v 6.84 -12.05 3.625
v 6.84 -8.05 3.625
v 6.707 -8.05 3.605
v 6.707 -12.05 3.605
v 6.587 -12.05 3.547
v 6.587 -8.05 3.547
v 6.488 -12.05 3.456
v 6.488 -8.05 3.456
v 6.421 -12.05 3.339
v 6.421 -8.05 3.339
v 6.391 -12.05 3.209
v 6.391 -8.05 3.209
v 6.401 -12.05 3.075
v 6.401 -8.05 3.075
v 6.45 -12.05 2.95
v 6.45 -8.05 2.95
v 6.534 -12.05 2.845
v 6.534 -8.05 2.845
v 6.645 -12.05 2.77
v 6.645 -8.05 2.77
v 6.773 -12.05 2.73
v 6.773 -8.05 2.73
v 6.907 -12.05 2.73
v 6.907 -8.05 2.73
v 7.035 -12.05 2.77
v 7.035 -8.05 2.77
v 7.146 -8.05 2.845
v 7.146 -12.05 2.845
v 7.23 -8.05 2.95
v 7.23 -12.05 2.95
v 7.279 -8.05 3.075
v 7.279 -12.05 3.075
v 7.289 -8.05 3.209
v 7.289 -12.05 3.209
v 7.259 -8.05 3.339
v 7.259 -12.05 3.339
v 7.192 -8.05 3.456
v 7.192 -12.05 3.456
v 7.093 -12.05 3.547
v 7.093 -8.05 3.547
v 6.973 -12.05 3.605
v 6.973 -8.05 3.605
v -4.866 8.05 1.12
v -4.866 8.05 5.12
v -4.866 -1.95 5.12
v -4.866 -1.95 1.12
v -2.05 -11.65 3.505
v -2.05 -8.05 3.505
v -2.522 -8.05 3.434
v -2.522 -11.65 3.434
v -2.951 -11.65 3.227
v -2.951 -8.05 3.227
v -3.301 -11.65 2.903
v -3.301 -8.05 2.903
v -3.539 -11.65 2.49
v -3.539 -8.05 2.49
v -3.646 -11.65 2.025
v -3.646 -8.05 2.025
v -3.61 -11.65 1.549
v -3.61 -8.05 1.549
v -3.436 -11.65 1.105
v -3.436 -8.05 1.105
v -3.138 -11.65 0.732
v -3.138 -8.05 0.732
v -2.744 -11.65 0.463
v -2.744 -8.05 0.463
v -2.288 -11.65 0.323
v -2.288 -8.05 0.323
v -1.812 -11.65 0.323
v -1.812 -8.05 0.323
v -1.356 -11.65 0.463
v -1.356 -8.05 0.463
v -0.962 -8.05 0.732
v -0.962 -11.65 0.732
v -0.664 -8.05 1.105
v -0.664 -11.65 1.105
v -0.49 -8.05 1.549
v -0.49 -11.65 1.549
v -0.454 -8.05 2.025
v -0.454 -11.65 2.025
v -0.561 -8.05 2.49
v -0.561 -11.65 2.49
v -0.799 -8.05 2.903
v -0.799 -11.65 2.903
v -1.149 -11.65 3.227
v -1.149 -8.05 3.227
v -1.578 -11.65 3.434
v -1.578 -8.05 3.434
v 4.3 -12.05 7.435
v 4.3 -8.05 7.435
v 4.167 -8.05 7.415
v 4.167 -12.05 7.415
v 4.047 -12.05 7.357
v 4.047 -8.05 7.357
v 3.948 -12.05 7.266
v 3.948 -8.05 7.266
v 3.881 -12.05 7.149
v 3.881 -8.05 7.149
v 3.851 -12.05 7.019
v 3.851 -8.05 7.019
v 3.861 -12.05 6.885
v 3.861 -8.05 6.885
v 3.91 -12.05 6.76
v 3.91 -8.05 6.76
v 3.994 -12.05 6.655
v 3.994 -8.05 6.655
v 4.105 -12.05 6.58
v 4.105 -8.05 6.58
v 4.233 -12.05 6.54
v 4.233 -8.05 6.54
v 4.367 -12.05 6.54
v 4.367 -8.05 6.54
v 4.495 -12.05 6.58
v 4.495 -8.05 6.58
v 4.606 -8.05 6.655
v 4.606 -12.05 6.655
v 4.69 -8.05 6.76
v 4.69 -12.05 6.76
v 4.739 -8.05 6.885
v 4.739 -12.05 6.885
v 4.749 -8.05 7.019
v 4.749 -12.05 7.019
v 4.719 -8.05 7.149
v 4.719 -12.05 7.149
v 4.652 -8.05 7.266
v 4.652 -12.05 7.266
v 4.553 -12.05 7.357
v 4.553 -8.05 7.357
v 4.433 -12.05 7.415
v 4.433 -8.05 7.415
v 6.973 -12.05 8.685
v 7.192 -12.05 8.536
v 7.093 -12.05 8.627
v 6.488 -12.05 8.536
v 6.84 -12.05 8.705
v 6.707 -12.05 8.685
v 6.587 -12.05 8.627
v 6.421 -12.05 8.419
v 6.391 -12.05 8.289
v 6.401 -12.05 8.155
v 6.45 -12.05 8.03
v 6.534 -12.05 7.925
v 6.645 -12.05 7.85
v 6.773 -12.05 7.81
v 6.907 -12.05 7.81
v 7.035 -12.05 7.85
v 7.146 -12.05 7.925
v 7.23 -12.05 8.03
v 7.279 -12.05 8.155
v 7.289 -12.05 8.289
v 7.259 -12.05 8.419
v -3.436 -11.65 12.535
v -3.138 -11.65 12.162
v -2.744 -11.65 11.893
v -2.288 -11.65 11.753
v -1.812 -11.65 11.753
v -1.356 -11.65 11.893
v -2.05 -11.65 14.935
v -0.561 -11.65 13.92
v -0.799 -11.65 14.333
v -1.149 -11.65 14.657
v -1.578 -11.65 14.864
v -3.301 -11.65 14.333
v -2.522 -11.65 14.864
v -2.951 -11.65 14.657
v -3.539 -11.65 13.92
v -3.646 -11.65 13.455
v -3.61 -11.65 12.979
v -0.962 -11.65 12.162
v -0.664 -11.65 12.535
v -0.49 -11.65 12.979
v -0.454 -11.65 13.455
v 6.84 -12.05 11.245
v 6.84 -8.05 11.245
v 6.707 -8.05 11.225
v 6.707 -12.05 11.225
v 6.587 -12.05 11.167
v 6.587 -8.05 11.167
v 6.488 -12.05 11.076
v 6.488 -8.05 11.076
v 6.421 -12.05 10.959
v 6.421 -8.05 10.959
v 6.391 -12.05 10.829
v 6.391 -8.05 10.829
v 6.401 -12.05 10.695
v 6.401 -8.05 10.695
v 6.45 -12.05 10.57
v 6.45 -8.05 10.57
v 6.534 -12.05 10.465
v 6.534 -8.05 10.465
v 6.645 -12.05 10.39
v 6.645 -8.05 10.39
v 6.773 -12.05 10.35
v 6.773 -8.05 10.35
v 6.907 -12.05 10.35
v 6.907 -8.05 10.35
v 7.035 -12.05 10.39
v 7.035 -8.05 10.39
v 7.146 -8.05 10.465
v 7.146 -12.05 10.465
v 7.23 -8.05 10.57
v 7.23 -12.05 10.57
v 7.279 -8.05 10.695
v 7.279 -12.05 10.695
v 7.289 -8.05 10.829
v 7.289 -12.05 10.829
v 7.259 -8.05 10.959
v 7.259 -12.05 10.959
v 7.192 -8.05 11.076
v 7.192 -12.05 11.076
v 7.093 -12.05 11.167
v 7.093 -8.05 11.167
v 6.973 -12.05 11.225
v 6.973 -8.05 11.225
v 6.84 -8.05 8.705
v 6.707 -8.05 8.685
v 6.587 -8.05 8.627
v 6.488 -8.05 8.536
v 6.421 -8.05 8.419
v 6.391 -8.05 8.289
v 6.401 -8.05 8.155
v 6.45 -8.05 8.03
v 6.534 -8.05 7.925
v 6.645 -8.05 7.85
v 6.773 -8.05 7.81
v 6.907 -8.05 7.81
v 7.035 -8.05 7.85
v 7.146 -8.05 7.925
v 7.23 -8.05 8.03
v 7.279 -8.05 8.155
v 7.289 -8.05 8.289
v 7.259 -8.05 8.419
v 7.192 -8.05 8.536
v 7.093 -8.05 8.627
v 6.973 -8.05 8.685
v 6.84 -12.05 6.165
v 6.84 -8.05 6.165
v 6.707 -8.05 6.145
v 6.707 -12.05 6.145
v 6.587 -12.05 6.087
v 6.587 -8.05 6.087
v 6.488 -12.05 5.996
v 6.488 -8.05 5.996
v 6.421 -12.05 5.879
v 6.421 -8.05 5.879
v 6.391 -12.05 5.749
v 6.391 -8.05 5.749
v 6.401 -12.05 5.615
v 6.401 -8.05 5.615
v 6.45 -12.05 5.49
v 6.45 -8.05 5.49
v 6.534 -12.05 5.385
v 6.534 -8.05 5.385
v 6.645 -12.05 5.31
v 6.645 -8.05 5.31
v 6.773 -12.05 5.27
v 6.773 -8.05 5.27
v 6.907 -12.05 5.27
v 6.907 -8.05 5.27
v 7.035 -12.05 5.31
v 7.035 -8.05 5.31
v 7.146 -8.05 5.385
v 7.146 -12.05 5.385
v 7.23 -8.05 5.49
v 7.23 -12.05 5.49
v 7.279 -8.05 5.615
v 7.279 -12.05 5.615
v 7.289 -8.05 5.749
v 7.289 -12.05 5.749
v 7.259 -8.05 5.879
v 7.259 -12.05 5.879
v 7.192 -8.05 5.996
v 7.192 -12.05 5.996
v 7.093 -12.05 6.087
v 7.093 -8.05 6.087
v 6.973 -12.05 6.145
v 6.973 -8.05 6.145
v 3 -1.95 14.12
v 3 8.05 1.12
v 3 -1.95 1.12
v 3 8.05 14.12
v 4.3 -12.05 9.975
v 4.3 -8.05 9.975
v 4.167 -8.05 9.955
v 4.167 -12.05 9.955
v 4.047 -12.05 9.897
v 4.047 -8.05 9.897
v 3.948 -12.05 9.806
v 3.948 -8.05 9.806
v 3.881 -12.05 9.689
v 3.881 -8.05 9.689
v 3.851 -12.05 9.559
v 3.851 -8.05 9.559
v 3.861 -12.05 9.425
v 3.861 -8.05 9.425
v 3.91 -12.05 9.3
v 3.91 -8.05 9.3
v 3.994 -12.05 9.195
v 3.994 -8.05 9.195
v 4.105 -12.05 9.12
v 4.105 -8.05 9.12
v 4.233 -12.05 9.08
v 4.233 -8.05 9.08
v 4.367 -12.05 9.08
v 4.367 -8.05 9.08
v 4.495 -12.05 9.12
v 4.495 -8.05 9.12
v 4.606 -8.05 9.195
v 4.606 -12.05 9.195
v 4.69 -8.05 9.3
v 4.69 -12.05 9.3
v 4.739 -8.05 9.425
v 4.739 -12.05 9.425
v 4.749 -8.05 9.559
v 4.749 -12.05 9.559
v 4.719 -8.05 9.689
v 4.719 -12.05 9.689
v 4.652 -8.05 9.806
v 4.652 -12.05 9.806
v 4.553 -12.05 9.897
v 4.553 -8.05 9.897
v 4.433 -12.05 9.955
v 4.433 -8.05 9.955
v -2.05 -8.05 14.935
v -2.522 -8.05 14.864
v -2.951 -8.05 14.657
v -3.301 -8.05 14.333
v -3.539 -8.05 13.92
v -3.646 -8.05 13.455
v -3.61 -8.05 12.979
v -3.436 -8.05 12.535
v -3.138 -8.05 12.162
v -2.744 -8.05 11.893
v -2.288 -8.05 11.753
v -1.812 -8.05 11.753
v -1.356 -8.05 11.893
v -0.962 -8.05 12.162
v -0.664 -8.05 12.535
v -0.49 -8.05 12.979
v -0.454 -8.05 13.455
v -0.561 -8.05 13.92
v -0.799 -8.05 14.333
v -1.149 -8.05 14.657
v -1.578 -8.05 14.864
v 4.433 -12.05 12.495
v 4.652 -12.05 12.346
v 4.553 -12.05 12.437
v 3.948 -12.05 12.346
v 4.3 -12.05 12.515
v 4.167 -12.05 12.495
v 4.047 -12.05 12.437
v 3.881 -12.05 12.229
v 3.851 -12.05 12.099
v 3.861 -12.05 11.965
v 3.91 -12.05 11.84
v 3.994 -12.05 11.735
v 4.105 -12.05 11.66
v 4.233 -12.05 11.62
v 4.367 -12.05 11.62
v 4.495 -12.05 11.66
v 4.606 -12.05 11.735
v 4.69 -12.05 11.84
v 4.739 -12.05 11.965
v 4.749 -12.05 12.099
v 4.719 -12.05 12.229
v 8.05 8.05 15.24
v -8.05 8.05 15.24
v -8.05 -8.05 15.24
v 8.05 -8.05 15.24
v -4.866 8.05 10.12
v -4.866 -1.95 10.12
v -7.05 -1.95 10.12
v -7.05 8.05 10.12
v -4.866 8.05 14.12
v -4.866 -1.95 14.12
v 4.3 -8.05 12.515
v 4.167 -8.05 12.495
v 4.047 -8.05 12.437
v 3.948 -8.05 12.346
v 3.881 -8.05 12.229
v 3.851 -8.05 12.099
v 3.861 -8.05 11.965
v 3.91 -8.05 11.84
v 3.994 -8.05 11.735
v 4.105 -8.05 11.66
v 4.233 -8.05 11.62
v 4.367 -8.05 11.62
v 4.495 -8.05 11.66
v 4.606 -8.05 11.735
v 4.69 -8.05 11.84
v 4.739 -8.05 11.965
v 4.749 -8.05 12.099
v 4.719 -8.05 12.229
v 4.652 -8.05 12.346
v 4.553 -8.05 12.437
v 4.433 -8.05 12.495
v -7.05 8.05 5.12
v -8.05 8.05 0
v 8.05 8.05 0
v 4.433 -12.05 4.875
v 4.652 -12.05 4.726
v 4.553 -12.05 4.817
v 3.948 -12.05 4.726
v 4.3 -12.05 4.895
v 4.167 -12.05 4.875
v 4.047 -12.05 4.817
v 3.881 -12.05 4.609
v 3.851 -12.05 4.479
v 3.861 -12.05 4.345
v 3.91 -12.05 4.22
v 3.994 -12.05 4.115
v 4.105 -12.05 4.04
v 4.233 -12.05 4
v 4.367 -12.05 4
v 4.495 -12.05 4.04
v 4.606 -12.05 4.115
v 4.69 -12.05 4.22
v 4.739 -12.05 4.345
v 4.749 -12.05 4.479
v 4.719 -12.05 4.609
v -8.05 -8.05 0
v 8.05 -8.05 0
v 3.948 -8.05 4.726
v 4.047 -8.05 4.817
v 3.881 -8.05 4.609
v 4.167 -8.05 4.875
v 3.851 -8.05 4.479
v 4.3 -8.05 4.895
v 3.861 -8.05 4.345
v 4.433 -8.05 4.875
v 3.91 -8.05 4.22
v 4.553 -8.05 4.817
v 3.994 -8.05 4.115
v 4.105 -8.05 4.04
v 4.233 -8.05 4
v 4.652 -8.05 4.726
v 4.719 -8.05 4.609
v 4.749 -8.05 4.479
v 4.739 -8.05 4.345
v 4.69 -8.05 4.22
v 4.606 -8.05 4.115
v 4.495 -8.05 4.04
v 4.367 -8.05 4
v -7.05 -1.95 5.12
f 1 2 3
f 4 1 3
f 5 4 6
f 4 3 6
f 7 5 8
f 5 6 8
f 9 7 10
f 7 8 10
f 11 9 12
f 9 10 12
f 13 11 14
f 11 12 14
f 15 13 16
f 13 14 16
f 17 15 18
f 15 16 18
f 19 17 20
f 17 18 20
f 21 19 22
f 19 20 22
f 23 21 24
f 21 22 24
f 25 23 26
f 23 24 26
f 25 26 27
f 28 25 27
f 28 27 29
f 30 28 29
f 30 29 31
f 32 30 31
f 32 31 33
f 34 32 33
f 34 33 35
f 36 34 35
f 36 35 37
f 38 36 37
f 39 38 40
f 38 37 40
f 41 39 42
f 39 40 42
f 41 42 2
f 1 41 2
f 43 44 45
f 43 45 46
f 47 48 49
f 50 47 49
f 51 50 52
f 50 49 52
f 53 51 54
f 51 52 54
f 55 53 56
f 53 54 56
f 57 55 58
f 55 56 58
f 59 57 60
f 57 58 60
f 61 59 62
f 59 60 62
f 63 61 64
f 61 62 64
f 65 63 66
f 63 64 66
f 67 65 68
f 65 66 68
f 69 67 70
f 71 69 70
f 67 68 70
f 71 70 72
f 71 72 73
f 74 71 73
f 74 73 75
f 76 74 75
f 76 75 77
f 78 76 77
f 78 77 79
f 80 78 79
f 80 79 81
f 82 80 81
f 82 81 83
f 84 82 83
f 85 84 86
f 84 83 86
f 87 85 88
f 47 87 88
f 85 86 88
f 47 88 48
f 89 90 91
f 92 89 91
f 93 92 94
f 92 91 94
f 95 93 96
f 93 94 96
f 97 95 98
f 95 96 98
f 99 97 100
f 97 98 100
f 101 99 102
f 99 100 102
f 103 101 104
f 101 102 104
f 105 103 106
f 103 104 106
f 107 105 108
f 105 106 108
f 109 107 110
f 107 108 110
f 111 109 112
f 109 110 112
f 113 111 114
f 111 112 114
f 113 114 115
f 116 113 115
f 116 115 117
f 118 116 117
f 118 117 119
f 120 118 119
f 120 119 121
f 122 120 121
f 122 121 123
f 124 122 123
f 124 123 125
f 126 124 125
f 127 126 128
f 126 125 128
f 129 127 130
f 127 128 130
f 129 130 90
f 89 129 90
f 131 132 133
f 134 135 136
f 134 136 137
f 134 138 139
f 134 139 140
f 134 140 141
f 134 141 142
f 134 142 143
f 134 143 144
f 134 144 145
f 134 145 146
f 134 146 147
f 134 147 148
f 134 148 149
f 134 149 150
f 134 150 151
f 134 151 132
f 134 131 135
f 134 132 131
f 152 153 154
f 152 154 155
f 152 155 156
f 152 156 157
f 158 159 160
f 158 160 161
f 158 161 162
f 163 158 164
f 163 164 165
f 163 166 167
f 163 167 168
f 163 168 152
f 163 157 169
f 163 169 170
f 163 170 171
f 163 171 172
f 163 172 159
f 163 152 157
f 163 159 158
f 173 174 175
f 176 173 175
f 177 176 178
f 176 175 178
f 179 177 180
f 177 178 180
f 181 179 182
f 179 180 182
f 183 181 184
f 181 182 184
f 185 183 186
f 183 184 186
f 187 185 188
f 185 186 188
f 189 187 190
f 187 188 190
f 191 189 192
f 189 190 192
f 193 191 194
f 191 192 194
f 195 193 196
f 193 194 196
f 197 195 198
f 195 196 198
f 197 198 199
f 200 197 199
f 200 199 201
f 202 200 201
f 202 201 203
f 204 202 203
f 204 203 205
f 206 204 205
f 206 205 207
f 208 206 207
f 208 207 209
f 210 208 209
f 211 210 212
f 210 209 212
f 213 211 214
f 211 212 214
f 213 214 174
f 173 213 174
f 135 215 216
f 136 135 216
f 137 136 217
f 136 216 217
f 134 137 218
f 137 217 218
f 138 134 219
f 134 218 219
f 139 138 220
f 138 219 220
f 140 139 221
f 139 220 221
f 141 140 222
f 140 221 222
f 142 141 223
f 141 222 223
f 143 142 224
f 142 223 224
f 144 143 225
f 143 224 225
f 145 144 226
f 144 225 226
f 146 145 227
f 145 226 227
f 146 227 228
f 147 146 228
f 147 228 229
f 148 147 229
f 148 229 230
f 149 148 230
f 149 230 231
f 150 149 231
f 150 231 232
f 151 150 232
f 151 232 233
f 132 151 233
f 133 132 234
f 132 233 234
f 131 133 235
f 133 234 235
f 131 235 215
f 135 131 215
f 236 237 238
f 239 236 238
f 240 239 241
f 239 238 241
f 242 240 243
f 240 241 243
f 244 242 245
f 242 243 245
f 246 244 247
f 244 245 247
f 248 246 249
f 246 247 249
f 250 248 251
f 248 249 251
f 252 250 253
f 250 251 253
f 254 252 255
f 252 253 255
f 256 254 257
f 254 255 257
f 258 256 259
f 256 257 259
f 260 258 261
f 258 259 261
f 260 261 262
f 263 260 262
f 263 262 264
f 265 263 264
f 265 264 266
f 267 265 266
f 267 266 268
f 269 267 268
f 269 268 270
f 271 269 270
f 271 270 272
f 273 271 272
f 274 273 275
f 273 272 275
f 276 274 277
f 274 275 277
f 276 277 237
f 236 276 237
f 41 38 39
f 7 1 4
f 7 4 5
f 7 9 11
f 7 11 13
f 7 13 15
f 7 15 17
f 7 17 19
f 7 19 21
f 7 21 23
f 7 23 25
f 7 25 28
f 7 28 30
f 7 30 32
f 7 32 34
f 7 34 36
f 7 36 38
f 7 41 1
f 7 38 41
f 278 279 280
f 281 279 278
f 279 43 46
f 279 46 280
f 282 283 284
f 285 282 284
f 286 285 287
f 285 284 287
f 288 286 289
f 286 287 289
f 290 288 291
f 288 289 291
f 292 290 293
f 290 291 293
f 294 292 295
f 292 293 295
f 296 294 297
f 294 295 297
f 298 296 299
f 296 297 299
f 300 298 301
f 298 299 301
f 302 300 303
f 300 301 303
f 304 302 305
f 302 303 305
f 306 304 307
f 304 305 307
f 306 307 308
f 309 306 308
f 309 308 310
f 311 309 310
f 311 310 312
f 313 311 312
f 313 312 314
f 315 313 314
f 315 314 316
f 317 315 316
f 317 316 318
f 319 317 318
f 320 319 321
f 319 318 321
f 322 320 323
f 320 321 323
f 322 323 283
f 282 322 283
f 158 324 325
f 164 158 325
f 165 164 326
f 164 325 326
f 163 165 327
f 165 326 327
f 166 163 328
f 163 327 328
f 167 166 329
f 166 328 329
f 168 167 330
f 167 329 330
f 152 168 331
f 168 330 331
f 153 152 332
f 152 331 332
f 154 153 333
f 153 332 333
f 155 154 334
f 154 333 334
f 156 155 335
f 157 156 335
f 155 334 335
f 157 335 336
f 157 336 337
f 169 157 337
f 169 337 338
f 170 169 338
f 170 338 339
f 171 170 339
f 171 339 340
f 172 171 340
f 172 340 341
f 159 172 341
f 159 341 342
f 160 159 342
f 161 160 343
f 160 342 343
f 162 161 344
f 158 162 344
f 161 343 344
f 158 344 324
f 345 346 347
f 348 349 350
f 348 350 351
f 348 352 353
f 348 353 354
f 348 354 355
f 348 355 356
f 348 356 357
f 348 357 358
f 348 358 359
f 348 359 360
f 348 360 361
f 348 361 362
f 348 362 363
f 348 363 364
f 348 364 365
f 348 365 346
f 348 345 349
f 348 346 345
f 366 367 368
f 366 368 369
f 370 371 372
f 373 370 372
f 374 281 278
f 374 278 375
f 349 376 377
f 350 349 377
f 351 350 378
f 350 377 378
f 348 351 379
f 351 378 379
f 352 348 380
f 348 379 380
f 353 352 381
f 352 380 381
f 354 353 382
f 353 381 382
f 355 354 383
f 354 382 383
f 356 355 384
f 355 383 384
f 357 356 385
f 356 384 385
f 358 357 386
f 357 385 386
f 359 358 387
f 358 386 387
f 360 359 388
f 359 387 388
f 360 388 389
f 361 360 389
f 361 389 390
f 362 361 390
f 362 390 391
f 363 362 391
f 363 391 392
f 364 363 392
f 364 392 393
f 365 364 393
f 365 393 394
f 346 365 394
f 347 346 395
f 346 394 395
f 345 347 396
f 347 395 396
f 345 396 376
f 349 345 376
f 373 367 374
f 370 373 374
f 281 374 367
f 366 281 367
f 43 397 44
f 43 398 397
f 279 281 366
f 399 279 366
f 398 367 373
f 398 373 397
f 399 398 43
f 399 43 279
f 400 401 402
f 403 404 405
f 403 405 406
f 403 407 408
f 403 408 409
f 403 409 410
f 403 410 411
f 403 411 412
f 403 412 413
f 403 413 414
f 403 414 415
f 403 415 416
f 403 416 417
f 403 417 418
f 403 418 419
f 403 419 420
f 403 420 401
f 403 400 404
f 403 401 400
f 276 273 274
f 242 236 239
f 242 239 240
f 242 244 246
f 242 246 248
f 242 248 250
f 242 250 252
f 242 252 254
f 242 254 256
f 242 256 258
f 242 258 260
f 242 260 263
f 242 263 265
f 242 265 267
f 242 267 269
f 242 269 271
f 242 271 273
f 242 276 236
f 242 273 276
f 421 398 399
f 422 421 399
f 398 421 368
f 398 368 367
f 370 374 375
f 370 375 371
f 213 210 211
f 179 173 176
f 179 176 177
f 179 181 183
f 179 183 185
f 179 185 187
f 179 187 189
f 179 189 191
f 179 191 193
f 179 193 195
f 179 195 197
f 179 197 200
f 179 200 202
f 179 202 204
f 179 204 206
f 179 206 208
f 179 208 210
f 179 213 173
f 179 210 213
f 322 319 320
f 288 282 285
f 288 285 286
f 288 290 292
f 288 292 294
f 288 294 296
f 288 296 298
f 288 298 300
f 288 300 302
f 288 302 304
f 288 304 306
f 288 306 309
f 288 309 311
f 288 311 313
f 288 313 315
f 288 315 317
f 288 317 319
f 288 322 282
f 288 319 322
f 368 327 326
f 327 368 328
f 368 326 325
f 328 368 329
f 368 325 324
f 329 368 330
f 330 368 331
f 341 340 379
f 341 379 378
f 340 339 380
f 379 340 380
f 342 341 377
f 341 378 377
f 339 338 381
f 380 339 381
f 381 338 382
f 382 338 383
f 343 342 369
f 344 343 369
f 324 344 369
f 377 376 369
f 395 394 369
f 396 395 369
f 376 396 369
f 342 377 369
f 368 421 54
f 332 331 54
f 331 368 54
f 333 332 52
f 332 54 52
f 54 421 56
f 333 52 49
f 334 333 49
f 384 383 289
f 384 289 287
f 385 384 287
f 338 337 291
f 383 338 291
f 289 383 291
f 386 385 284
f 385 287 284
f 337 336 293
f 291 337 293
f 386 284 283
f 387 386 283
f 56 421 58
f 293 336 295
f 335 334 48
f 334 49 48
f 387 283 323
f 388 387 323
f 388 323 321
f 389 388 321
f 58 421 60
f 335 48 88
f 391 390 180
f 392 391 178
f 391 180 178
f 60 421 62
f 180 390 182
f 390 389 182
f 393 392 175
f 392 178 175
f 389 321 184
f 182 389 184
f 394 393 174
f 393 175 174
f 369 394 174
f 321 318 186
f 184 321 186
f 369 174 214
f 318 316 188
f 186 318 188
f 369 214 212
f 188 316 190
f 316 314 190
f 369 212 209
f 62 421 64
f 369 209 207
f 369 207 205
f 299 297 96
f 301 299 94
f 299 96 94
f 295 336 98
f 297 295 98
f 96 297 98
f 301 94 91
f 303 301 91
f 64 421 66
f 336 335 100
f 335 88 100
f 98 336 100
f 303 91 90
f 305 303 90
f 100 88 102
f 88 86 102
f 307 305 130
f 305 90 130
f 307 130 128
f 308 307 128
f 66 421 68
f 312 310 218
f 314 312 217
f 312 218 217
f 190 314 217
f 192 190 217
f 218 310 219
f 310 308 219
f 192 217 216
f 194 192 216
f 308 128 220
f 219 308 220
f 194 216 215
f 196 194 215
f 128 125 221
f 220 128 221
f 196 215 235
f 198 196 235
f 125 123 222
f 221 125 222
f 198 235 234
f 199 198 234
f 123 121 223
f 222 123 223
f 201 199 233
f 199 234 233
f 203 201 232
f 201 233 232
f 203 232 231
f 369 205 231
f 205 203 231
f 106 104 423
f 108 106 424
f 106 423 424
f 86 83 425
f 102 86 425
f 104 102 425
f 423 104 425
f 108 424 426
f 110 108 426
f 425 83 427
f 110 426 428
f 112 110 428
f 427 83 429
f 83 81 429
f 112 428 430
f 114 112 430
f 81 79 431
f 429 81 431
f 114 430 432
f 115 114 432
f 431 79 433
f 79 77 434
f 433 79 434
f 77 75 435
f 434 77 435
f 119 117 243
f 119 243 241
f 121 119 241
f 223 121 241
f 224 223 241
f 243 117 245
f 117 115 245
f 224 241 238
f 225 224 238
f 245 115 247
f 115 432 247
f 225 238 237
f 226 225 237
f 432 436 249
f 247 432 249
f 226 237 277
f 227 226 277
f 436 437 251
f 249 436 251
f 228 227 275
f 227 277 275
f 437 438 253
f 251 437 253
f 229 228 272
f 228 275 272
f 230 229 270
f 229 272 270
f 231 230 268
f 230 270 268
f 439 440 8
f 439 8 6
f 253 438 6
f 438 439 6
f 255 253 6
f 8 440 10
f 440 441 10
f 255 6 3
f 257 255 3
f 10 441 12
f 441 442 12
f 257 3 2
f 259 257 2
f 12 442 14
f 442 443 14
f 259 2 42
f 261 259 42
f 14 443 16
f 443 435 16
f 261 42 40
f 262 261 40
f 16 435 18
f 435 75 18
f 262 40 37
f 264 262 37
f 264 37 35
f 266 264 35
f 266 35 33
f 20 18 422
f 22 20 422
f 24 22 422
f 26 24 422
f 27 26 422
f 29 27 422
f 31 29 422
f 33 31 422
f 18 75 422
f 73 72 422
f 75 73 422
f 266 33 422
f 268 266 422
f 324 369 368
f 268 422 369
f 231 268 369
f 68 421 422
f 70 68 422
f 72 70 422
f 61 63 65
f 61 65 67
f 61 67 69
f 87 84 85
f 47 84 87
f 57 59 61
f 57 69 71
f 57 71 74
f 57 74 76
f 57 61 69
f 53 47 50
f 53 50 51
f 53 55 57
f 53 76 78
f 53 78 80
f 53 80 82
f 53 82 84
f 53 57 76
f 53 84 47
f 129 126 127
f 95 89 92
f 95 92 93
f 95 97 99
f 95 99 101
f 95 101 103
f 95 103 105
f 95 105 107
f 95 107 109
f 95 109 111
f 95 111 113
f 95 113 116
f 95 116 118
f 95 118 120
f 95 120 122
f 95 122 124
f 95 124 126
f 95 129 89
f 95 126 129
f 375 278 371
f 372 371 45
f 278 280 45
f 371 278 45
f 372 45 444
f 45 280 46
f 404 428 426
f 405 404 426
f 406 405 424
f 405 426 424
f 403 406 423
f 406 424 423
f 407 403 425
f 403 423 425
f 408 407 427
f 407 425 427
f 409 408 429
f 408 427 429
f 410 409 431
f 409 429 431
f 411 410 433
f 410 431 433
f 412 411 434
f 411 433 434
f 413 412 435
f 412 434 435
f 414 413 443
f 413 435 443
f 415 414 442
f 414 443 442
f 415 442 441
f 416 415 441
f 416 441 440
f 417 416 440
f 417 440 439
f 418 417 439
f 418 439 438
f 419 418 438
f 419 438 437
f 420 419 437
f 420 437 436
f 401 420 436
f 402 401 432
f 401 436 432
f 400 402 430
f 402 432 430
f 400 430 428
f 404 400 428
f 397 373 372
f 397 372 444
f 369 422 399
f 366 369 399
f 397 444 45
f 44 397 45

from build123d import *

# Parameters (mm, degrees)
SKETCH1_W            = 16.1
SKETCH1_H            = 16.1
BOSS_EXTRUDE1_DEPTH  = 15.24
SKETCH2_R            = 1.6
BOSS_EXTRUDE2_DEPTH  = 3.6
SKETCH2_4_R          = 0.45
BOSS_EXTRUDE3_DEPTH  = 4
SKETCH2_5_R          = 0.45
BOSS_EXTRUDE4_DEPTH  = 4
LPATTERN1_COUNT      = 3
LPATTERN1_PITCH      = 2.54
LPATTERN1_COUNT_DIR2 = 2
LPATTERN1_PITCH_DIR2 = 2.54
LPATTERN2_COUNT      = 2
LPATTERN2_PITCH      = 2.54
LPATTERN2_COUNT_DIR2 = 3
LPATTERN2_PITCH_DIR2 = 2.54
CUT_EXTRUDE1_DEPTH   = 10


with BuildPart() as part:
    # Sketch1 → Boss-Extrude1 (new body)
    with BuildSketch(Plane.XY):
        Rectangle(SKETCH1_W, SKETCH1_H)
    extrude(amount=BOSS_EXTRUDE1_DEPTH)

    # Sketch2 → Boss-Extrude2 (add)
    with BuildSketch(Plane.XZ.offset(8.05)):
        with Locations((-2.05, 13.335)):
            Circle(SKETCH2_R)
        with Locations((-2.05, 1.905)):
            Circle(SKETCH2_R)
    extrude(amount=BOSS_EXTRUDE2_DEPTH)

    # Sketch2<4> → Boss-Extrude3 (add)
    with BuildSketch(Plane.XZ.offset(8.05)):
        with Locations((4.3, 6.985)):
            Circle(SKETCH2_4_R)
    boss_extrude3 = extrude(amount=BOSS_EXTRUDE3_DEPTH)

    # Sketch2<5> → Boss-Extrude4 (add)
    with BuildSketch(Plane.XZ.offset(8.05)):
        with Locations((6.84, 8.255)):
            Circle(SKETCH2_5_R)
    boss_extrude4 = extrude(amount=BOSS_EXTRUDE4_DEPTH)

    # LPattern1: Boss-Extrude4 3 × 2
    with Locations(*[Vector(0, 0, -1) * (i * LPATTERN1_PITCH) + Vector(0, 0, 1) * (j * LPATTERN1_PITCH_DIR2) for i in range(LPATTERN1_COUNT) for j in range(LPATTERN1_COUNT_DIR2) if (i, j) != (0, 0)]):
        add(boss_extrude4)

    # LPattern2: Boss-Extrude3 2 × 3
    with Locations(*[Vector(0, 0, -1) * (i * LPATTERN2_PITCH) + Vector(0, 0, 1) * (j * LPATTERN2_PITCH_DIR2) for i in range(LPATTERN2_COUNT) for j in range(LPATTERN2_COUNT_DIR2) if (i, j) != (0, 0)]):
        add(boss_extrude3)

    # Sketch3 → Cut-Extrude1 (cut)
    with BuildSketch(Plane(origin=(0, 8.05, 0), x_dir=(1, 0, 0), z_dir=(0, 1, 0))):
        Polygon((3, -14.12), (-4.865675626, -14.12), (-4.865675626, -10.12), (-7.05, -10.12), (-7.05, -5.12), (-4.865675626, -5.12), (-4.865675626, -1.12), (3, -1.12), align=None)
    extrude(amount=-CUT_EXTRUDE1_DEPTH, mode=Mode.SUBTRACT)


solid = part.part
